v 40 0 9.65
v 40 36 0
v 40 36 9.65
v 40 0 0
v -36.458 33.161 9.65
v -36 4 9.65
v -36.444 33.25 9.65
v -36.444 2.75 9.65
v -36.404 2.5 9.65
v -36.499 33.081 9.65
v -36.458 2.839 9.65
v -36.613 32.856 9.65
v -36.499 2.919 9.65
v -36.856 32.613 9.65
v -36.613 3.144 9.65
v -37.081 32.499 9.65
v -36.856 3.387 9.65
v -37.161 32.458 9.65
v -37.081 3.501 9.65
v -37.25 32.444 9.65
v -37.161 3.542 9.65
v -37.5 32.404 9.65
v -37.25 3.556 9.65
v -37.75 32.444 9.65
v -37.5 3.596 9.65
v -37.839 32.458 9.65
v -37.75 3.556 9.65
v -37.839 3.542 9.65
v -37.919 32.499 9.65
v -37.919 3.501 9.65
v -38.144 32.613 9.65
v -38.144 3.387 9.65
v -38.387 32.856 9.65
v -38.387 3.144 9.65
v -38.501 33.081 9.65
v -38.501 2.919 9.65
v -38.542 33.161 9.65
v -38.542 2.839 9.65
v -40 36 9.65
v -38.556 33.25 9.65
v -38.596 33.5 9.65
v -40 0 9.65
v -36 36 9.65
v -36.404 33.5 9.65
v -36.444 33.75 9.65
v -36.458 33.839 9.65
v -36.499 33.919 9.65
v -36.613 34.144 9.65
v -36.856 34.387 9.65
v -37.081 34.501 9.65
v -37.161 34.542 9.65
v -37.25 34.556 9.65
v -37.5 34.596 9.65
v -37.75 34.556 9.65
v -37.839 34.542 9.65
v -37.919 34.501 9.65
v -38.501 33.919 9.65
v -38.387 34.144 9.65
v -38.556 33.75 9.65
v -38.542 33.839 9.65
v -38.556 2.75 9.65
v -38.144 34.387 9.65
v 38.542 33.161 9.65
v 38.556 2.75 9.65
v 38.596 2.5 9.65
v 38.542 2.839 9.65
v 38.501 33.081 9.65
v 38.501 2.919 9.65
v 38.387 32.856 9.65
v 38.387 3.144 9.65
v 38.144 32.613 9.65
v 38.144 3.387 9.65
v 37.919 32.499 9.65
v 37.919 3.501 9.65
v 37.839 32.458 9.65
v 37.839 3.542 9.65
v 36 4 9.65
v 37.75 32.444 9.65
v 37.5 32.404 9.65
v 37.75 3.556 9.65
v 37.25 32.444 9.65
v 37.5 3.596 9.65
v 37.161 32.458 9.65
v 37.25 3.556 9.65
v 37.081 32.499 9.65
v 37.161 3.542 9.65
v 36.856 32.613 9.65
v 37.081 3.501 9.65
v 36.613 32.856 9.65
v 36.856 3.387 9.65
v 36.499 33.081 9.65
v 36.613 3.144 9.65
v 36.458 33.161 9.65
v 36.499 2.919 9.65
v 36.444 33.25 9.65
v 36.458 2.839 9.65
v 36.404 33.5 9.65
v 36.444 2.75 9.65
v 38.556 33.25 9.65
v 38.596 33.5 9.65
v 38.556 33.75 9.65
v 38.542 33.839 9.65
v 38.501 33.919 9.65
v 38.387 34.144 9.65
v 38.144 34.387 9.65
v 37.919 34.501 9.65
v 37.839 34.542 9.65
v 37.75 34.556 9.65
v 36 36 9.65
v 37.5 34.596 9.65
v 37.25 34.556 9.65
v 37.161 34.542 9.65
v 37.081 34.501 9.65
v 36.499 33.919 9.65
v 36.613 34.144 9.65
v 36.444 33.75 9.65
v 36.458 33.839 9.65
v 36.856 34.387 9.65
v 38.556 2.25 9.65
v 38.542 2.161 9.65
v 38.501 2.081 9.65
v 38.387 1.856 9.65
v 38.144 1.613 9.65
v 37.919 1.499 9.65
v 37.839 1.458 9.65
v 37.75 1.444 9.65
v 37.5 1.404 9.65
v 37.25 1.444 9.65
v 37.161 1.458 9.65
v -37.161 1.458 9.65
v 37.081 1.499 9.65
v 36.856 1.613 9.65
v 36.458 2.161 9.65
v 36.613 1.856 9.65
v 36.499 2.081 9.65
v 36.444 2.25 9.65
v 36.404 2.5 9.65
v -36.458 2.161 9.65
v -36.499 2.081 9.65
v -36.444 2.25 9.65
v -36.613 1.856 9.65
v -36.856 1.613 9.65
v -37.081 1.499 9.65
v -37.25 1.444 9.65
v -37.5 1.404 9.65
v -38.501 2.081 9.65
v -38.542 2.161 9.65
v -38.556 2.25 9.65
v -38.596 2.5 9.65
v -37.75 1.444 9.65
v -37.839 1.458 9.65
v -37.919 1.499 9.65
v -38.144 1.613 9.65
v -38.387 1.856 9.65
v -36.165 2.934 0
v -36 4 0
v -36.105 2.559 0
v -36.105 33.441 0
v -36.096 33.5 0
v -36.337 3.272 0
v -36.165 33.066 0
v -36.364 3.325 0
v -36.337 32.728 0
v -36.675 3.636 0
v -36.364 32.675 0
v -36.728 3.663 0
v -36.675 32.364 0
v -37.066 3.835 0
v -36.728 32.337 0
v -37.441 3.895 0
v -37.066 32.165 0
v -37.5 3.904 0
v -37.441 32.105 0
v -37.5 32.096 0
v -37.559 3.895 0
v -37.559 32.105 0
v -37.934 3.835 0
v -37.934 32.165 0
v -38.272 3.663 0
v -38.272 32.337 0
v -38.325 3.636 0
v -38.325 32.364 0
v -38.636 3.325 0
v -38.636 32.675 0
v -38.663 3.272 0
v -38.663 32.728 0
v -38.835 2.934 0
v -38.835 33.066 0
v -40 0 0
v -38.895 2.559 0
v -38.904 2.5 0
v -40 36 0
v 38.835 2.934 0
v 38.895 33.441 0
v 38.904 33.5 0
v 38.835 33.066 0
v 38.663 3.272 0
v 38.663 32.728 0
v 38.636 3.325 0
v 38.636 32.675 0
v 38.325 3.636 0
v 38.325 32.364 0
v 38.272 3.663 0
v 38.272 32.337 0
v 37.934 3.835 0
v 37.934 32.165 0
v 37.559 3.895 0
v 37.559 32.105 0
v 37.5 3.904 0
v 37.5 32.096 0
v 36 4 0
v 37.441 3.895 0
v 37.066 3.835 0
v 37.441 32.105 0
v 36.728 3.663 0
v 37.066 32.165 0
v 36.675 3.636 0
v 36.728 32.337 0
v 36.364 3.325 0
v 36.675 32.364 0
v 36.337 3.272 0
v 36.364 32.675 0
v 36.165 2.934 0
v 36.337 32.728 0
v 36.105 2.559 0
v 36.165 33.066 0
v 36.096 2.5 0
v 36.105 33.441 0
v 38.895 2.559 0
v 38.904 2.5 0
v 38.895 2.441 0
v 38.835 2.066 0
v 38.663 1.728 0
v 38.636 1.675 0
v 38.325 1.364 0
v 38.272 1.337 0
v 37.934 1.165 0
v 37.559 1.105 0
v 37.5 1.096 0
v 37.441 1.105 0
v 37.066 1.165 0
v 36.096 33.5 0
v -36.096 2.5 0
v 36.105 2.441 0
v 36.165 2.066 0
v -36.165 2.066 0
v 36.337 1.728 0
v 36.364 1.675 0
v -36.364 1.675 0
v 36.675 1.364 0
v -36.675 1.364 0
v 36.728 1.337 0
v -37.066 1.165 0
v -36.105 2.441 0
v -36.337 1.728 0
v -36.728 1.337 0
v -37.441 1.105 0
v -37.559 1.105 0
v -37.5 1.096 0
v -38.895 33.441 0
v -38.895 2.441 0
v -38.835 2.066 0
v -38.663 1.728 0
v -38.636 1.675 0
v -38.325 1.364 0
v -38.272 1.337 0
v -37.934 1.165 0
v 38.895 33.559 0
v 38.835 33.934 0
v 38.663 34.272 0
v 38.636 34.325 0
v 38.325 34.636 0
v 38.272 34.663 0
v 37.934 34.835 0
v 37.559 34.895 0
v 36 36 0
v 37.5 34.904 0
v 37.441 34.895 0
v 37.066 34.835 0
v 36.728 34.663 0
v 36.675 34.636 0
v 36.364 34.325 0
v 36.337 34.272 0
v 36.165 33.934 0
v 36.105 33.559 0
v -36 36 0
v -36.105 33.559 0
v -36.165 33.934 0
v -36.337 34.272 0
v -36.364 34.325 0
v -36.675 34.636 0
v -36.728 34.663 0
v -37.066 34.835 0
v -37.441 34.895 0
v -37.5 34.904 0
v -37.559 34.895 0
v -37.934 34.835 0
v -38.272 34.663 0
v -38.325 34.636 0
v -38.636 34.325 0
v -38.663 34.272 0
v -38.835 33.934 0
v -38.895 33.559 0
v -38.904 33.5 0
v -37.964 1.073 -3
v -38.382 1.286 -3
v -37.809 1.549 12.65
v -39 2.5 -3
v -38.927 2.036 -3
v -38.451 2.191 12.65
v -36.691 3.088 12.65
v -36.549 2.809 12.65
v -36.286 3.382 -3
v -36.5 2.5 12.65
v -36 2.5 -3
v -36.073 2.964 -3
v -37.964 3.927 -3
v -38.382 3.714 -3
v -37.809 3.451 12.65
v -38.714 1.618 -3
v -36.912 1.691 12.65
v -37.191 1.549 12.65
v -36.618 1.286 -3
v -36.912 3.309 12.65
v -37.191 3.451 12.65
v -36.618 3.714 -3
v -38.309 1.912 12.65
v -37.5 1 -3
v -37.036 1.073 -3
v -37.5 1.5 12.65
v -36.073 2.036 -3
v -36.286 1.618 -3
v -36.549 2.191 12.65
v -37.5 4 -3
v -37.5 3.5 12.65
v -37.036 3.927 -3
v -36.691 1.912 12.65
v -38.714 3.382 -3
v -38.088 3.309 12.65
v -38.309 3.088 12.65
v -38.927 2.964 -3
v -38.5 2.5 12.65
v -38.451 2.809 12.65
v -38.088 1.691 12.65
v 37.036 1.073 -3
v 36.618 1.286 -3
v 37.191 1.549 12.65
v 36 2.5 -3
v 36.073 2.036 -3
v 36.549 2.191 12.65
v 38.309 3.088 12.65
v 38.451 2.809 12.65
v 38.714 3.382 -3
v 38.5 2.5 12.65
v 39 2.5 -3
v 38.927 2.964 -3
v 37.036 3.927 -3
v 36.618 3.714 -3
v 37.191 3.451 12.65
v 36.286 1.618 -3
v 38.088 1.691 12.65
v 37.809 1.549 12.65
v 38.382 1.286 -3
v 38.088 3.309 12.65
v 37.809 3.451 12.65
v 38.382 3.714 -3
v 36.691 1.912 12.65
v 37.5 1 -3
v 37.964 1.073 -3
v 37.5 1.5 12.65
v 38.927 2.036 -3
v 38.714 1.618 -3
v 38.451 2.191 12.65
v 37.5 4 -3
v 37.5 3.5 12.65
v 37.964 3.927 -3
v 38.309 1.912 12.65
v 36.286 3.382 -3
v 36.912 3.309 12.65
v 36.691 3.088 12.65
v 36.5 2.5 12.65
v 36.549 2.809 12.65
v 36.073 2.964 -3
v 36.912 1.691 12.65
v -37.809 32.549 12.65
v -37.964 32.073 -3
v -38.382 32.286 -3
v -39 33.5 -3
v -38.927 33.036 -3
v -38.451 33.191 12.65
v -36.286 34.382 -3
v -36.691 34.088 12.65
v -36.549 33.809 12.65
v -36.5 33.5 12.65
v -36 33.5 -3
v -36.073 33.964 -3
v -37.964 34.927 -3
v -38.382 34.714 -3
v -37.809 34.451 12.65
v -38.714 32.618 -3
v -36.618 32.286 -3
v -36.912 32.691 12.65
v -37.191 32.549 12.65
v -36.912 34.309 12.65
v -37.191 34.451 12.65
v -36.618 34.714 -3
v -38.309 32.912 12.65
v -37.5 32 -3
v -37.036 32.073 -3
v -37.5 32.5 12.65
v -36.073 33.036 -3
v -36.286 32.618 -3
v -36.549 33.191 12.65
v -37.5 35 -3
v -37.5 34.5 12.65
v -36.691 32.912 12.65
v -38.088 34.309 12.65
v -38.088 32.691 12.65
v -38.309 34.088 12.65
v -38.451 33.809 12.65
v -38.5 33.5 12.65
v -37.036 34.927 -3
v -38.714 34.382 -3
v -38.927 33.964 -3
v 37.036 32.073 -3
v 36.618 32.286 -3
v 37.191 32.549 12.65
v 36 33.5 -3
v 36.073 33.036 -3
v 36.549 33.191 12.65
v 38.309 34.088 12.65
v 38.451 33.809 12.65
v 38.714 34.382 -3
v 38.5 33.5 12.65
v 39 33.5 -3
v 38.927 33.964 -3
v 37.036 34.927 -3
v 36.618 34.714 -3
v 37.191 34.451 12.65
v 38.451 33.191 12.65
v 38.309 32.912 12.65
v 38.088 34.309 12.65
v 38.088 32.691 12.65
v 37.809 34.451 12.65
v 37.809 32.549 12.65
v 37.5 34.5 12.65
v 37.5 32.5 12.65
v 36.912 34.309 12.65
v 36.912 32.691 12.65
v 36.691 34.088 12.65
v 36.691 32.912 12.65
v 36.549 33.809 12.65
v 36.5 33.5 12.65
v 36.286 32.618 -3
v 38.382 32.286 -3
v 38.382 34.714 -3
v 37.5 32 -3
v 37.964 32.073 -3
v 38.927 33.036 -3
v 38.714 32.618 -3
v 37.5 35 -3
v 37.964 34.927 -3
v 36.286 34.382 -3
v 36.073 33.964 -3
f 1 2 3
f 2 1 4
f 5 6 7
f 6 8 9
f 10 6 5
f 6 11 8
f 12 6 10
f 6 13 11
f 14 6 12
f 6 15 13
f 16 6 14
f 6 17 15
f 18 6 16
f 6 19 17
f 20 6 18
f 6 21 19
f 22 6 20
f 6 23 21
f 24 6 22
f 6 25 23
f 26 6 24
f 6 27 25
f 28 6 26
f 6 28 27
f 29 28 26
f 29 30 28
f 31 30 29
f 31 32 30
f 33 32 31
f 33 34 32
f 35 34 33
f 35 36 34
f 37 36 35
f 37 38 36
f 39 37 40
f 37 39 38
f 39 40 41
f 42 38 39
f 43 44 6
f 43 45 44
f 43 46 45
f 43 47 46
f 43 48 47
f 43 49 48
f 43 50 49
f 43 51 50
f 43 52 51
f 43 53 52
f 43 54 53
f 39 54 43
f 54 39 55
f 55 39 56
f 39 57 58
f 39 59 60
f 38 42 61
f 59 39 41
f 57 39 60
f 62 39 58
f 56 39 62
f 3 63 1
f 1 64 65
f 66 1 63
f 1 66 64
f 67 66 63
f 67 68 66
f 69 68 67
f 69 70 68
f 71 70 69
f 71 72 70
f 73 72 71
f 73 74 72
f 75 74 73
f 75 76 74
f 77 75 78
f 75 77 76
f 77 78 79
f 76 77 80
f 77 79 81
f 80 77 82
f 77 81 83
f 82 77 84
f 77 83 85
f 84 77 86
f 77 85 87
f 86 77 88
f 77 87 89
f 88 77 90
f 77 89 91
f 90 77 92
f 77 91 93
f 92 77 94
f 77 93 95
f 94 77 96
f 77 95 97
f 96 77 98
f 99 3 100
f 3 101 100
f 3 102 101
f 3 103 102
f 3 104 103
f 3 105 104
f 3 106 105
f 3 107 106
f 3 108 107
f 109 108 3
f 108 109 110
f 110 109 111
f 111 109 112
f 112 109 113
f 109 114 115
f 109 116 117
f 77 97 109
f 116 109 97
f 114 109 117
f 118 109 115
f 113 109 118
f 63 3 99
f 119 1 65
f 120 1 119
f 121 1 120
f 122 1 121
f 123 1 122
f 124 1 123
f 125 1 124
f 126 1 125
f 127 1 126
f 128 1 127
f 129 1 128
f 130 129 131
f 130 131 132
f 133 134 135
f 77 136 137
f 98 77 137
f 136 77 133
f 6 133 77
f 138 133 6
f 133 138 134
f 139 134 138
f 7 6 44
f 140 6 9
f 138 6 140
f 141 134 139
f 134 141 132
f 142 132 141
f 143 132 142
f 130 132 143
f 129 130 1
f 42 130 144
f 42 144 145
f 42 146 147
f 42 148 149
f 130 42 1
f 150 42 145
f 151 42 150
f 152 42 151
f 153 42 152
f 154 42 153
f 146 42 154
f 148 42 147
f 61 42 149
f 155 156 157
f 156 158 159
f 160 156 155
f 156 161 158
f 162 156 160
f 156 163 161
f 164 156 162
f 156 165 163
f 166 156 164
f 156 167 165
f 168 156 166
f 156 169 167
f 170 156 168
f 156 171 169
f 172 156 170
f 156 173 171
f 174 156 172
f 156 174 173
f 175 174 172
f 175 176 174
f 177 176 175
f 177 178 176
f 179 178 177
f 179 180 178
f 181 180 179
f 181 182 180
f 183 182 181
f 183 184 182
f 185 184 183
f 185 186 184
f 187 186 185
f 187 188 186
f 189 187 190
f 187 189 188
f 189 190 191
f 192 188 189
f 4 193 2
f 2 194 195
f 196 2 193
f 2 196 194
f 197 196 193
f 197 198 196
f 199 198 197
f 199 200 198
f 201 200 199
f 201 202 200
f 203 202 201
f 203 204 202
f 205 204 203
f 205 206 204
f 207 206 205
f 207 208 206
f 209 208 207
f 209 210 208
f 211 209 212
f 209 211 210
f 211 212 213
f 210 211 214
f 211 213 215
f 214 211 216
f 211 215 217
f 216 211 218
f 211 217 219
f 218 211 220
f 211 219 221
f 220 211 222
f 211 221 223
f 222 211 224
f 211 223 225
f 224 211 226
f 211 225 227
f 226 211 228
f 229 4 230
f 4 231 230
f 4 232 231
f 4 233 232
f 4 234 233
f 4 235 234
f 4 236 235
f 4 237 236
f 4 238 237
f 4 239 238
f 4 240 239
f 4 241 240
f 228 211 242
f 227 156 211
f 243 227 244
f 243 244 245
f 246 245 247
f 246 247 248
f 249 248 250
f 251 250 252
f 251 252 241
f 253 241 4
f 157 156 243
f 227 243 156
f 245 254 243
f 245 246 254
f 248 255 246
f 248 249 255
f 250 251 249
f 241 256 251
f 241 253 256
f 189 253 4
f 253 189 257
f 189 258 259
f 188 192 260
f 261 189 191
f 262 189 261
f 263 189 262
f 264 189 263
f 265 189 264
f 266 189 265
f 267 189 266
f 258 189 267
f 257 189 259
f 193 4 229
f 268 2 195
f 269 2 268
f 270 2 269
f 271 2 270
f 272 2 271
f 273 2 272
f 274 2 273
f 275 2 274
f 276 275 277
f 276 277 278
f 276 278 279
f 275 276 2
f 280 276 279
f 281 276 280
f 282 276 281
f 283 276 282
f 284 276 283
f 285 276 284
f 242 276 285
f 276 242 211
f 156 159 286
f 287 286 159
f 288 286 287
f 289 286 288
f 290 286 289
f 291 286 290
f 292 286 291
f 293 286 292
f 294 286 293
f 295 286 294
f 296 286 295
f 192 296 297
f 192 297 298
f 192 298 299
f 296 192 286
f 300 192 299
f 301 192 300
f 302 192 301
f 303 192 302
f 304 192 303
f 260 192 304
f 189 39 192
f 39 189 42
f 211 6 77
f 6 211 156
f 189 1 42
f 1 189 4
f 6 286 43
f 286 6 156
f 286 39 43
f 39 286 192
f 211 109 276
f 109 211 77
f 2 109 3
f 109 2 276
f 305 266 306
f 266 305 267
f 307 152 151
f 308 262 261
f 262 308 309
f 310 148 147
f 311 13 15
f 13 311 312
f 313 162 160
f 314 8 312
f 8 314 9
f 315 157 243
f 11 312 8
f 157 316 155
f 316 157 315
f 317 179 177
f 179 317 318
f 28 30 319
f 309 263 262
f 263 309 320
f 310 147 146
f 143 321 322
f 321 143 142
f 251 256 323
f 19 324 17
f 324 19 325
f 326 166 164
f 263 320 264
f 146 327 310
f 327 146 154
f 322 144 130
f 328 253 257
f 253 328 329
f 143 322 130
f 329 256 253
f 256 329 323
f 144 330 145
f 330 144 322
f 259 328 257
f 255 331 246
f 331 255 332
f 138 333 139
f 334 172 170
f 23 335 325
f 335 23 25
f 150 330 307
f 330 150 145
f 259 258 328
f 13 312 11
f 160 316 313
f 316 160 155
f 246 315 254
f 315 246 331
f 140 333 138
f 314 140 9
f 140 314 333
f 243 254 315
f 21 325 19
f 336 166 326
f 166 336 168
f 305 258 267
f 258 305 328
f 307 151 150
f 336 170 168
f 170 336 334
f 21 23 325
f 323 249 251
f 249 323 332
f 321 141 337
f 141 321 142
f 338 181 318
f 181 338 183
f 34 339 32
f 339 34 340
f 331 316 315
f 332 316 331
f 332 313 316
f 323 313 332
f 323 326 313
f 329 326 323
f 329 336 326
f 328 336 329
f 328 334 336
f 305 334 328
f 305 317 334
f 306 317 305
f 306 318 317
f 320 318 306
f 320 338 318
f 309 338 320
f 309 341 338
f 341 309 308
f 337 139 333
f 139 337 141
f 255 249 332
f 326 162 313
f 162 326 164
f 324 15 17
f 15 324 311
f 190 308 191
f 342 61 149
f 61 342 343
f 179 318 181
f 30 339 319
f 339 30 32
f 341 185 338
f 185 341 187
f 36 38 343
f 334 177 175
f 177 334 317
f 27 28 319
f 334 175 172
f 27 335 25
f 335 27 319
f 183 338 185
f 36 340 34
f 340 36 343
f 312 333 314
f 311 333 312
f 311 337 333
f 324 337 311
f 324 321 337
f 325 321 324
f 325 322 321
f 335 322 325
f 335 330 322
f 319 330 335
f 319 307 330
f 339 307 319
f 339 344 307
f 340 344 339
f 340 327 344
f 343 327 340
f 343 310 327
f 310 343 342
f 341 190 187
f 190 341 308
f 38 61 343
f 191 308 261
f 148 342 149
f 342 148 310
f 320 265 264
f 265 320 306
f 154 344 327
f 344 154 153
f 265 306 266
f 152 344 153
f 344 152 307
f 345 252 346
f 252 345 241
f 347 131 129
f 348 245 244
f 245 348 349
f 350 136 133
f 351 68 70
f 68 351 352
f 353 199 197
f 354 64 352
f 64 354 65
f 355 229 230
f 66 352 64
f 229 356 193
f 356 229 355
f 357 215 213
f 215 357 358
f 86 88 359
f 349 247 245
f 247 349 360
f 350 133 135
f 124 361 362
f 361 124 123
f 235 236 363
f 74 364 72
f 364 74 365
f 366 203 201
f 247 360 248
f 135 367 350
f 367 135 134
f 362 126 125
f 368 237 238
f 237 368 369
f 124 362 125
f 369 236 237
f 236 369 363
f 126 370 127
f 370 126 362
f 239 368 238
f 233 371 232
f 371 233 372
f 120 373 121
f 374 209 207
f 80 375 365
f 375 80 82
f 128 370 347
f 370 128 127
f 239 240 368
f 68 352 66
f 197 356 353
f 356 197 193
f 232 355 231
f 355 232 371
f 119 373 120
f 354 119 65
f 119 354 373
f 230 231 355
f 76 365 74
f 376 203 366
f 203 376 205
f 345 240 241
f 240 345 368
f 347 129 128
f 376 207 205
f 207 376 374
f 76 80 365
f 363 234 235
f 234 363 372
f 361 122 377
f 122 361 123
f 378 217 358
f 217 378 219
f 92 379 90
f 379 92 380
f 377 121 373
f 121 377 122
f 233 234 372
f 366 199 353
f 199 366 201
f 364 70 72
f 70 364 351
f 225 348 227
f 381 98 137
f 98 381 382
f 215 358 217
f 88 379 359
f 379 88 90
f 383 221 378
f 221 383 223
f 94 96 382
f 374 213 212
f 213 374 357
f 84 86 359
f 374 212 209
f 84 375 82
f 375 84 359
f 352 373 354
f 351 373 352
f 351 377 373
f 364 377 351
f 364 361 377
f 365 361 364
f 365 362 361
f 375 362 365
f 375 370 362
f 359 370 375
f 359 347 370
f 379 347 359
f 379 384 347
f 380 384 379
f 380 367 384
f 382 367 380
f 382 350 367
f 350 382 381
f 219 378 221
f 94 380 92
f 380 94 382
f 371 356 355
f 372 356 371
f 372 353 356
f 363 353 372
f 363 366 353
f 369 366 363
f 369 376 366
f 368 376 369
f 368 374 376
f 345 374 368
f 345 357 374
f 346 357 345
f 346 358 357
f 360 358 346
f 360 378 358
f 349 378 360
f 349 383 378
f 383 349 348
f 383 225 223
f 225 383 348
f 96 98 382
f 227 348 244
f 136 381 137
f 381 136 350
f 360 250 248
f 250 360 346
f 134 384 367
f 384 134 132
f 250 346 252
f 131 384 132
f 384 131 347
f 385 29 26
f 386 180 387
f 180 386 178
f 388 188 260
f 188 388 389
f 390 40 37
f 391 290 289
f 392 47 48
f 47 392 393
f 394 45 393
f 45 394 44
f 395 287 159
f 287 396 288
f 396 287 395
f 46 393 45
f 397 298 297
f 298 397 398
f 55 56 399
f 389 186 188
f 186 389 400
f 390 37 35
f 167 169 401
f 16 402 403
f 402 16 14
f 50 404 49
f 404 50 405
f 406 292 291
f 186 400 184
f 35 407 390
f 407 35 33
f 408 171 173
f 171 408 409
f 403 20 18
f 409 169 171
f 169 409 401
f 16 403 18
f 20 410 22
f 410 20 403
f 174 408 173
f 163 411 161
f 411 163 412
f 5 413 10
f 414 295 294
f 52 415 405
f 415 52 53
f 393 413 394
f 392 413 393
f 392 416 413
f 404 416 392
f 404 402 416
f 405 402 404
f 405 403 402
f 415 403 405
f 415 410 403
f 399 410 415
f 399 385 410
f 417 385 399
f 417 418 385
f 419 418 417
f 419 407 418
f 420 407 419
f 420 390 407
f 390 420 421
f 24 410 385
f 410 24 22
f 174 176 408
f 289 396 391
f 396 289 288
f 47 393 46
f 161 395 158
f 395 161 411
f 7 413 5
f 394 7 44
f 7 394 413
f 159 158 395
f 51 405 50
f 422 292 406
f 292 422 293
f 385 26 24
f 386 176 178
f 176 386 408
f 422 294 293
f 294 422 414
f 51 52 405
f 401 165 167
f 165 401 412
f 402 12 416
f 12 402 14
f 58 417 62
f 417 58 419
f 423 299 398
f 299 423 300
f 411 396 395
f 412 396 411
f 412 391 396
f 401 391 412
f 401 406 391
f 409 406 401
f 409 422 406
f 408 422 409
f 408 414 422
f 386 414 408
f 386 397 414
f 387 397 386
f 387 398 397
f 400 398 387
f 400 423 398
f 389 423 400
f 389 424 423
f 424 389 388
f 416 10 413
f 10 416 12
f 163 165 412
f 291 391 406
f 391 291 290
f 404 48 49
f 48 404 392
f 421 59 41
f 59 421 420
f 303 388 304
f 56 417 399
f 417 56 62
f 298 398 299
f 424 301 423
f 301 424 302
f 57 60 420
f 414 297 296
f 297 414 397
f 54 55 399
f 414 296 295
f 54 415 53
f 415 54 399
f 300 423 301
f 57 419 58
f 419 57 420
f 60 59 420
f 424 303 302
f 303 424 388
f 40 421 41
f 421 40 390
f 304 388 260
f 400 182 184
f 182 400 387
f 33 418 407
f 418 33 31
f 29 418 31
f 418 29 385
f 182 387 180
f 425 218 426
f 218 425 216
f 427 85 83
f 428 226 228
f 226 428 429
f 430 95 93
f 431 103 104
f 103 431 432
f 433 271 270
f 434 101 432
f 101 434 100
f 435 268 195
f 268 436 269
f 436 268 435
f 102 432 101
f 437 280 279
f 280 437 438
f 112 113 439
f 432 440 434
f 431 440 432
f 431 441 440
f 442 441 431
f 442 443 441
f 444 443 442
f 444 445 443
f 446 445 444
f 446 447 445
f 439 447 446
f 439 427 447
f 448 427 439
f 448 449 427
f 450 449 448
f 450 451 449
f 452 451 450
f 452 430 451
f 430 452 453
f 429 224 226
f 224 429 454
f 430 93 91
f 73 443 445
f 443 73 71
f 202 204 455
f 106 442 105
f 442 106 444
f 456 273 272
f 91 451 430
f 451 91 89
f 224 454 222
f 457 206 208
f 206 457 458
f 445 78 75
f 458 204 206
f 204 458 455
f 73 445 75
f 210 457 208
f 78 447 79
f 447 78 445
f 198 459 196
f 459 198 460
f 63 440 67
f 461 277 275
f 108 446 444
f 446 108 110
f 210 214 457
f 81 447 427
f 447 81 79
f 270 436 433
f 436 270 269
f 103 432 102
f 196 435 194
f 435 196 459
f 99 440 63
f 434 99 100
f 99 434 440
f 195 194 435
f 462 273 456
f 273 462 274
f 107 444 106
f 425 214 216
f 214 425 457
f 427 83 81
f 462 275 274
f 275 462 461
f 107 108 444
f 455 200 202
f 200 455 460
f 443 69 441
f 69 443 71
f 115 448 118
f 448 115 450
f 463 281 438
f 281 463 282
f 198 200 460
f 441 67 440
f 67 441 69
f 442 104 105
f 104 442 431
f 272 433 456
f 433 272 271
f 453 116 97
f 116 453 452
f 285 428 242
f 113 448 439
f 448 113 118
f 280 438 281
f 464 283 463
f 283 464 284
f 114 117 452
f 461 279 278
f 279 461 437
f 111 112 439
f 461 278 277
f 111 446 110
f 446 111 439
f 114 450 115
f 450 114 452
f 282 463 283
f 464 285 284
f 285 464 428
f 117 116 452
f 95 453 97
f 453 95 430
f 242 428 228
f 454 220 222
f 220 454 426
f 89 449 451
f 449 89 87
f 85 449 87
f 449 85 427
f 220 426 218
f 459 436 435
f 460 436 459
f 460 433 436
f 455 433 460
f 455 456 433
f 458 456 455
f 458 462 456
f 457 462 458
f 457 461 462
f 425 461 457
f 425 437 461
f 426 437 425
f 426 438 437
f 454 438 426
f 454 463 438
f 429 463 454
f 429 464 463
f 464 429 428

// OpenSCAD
$fn = 20;
eps = 1e-3;

// TODO: Proper dimensions.
size_x = 80;
size_y = 36;
size_z = 9.65;
width = 4;

pin_length = 3;
pin_radius = 1.5;
pin_offset_left = 2.5;
pin_offset_right = pin_offset_left;
pin_offset_top = 2.5;
pin_offset_bottom = pin_offset_top;

translate([-size_x/2, 0, 0]) {
  cube([size_x, width, size_z]);
  cube([width, size_y, size_z]);
  translate([size_x - width, 0, 0]) {
    cube([width, size_y, size_z]);
  }
  translate([pin_offset_left, pin_offset_bottom, -pin_length]) {
    cylinder(2*pin_length + size_z, pin_radius);
  }
  translate([size_x - pin_offset_right, pin_offset_bottom, -pin_length]) {
    cylinder(2*pin_length + size_z, pin_radius);
  }
  translate([pin_offset_left, size_y - pin_offset_top, -pin_length]) {
    cylinder(2*pin_length + size_z, pin_radius);
  }
  translate([size_x - pin_offset_right, size_y - pin_offset_top, -pin_length]) {
    cylinder(2*pin_length + size_z, pin_radius);
  }
}
